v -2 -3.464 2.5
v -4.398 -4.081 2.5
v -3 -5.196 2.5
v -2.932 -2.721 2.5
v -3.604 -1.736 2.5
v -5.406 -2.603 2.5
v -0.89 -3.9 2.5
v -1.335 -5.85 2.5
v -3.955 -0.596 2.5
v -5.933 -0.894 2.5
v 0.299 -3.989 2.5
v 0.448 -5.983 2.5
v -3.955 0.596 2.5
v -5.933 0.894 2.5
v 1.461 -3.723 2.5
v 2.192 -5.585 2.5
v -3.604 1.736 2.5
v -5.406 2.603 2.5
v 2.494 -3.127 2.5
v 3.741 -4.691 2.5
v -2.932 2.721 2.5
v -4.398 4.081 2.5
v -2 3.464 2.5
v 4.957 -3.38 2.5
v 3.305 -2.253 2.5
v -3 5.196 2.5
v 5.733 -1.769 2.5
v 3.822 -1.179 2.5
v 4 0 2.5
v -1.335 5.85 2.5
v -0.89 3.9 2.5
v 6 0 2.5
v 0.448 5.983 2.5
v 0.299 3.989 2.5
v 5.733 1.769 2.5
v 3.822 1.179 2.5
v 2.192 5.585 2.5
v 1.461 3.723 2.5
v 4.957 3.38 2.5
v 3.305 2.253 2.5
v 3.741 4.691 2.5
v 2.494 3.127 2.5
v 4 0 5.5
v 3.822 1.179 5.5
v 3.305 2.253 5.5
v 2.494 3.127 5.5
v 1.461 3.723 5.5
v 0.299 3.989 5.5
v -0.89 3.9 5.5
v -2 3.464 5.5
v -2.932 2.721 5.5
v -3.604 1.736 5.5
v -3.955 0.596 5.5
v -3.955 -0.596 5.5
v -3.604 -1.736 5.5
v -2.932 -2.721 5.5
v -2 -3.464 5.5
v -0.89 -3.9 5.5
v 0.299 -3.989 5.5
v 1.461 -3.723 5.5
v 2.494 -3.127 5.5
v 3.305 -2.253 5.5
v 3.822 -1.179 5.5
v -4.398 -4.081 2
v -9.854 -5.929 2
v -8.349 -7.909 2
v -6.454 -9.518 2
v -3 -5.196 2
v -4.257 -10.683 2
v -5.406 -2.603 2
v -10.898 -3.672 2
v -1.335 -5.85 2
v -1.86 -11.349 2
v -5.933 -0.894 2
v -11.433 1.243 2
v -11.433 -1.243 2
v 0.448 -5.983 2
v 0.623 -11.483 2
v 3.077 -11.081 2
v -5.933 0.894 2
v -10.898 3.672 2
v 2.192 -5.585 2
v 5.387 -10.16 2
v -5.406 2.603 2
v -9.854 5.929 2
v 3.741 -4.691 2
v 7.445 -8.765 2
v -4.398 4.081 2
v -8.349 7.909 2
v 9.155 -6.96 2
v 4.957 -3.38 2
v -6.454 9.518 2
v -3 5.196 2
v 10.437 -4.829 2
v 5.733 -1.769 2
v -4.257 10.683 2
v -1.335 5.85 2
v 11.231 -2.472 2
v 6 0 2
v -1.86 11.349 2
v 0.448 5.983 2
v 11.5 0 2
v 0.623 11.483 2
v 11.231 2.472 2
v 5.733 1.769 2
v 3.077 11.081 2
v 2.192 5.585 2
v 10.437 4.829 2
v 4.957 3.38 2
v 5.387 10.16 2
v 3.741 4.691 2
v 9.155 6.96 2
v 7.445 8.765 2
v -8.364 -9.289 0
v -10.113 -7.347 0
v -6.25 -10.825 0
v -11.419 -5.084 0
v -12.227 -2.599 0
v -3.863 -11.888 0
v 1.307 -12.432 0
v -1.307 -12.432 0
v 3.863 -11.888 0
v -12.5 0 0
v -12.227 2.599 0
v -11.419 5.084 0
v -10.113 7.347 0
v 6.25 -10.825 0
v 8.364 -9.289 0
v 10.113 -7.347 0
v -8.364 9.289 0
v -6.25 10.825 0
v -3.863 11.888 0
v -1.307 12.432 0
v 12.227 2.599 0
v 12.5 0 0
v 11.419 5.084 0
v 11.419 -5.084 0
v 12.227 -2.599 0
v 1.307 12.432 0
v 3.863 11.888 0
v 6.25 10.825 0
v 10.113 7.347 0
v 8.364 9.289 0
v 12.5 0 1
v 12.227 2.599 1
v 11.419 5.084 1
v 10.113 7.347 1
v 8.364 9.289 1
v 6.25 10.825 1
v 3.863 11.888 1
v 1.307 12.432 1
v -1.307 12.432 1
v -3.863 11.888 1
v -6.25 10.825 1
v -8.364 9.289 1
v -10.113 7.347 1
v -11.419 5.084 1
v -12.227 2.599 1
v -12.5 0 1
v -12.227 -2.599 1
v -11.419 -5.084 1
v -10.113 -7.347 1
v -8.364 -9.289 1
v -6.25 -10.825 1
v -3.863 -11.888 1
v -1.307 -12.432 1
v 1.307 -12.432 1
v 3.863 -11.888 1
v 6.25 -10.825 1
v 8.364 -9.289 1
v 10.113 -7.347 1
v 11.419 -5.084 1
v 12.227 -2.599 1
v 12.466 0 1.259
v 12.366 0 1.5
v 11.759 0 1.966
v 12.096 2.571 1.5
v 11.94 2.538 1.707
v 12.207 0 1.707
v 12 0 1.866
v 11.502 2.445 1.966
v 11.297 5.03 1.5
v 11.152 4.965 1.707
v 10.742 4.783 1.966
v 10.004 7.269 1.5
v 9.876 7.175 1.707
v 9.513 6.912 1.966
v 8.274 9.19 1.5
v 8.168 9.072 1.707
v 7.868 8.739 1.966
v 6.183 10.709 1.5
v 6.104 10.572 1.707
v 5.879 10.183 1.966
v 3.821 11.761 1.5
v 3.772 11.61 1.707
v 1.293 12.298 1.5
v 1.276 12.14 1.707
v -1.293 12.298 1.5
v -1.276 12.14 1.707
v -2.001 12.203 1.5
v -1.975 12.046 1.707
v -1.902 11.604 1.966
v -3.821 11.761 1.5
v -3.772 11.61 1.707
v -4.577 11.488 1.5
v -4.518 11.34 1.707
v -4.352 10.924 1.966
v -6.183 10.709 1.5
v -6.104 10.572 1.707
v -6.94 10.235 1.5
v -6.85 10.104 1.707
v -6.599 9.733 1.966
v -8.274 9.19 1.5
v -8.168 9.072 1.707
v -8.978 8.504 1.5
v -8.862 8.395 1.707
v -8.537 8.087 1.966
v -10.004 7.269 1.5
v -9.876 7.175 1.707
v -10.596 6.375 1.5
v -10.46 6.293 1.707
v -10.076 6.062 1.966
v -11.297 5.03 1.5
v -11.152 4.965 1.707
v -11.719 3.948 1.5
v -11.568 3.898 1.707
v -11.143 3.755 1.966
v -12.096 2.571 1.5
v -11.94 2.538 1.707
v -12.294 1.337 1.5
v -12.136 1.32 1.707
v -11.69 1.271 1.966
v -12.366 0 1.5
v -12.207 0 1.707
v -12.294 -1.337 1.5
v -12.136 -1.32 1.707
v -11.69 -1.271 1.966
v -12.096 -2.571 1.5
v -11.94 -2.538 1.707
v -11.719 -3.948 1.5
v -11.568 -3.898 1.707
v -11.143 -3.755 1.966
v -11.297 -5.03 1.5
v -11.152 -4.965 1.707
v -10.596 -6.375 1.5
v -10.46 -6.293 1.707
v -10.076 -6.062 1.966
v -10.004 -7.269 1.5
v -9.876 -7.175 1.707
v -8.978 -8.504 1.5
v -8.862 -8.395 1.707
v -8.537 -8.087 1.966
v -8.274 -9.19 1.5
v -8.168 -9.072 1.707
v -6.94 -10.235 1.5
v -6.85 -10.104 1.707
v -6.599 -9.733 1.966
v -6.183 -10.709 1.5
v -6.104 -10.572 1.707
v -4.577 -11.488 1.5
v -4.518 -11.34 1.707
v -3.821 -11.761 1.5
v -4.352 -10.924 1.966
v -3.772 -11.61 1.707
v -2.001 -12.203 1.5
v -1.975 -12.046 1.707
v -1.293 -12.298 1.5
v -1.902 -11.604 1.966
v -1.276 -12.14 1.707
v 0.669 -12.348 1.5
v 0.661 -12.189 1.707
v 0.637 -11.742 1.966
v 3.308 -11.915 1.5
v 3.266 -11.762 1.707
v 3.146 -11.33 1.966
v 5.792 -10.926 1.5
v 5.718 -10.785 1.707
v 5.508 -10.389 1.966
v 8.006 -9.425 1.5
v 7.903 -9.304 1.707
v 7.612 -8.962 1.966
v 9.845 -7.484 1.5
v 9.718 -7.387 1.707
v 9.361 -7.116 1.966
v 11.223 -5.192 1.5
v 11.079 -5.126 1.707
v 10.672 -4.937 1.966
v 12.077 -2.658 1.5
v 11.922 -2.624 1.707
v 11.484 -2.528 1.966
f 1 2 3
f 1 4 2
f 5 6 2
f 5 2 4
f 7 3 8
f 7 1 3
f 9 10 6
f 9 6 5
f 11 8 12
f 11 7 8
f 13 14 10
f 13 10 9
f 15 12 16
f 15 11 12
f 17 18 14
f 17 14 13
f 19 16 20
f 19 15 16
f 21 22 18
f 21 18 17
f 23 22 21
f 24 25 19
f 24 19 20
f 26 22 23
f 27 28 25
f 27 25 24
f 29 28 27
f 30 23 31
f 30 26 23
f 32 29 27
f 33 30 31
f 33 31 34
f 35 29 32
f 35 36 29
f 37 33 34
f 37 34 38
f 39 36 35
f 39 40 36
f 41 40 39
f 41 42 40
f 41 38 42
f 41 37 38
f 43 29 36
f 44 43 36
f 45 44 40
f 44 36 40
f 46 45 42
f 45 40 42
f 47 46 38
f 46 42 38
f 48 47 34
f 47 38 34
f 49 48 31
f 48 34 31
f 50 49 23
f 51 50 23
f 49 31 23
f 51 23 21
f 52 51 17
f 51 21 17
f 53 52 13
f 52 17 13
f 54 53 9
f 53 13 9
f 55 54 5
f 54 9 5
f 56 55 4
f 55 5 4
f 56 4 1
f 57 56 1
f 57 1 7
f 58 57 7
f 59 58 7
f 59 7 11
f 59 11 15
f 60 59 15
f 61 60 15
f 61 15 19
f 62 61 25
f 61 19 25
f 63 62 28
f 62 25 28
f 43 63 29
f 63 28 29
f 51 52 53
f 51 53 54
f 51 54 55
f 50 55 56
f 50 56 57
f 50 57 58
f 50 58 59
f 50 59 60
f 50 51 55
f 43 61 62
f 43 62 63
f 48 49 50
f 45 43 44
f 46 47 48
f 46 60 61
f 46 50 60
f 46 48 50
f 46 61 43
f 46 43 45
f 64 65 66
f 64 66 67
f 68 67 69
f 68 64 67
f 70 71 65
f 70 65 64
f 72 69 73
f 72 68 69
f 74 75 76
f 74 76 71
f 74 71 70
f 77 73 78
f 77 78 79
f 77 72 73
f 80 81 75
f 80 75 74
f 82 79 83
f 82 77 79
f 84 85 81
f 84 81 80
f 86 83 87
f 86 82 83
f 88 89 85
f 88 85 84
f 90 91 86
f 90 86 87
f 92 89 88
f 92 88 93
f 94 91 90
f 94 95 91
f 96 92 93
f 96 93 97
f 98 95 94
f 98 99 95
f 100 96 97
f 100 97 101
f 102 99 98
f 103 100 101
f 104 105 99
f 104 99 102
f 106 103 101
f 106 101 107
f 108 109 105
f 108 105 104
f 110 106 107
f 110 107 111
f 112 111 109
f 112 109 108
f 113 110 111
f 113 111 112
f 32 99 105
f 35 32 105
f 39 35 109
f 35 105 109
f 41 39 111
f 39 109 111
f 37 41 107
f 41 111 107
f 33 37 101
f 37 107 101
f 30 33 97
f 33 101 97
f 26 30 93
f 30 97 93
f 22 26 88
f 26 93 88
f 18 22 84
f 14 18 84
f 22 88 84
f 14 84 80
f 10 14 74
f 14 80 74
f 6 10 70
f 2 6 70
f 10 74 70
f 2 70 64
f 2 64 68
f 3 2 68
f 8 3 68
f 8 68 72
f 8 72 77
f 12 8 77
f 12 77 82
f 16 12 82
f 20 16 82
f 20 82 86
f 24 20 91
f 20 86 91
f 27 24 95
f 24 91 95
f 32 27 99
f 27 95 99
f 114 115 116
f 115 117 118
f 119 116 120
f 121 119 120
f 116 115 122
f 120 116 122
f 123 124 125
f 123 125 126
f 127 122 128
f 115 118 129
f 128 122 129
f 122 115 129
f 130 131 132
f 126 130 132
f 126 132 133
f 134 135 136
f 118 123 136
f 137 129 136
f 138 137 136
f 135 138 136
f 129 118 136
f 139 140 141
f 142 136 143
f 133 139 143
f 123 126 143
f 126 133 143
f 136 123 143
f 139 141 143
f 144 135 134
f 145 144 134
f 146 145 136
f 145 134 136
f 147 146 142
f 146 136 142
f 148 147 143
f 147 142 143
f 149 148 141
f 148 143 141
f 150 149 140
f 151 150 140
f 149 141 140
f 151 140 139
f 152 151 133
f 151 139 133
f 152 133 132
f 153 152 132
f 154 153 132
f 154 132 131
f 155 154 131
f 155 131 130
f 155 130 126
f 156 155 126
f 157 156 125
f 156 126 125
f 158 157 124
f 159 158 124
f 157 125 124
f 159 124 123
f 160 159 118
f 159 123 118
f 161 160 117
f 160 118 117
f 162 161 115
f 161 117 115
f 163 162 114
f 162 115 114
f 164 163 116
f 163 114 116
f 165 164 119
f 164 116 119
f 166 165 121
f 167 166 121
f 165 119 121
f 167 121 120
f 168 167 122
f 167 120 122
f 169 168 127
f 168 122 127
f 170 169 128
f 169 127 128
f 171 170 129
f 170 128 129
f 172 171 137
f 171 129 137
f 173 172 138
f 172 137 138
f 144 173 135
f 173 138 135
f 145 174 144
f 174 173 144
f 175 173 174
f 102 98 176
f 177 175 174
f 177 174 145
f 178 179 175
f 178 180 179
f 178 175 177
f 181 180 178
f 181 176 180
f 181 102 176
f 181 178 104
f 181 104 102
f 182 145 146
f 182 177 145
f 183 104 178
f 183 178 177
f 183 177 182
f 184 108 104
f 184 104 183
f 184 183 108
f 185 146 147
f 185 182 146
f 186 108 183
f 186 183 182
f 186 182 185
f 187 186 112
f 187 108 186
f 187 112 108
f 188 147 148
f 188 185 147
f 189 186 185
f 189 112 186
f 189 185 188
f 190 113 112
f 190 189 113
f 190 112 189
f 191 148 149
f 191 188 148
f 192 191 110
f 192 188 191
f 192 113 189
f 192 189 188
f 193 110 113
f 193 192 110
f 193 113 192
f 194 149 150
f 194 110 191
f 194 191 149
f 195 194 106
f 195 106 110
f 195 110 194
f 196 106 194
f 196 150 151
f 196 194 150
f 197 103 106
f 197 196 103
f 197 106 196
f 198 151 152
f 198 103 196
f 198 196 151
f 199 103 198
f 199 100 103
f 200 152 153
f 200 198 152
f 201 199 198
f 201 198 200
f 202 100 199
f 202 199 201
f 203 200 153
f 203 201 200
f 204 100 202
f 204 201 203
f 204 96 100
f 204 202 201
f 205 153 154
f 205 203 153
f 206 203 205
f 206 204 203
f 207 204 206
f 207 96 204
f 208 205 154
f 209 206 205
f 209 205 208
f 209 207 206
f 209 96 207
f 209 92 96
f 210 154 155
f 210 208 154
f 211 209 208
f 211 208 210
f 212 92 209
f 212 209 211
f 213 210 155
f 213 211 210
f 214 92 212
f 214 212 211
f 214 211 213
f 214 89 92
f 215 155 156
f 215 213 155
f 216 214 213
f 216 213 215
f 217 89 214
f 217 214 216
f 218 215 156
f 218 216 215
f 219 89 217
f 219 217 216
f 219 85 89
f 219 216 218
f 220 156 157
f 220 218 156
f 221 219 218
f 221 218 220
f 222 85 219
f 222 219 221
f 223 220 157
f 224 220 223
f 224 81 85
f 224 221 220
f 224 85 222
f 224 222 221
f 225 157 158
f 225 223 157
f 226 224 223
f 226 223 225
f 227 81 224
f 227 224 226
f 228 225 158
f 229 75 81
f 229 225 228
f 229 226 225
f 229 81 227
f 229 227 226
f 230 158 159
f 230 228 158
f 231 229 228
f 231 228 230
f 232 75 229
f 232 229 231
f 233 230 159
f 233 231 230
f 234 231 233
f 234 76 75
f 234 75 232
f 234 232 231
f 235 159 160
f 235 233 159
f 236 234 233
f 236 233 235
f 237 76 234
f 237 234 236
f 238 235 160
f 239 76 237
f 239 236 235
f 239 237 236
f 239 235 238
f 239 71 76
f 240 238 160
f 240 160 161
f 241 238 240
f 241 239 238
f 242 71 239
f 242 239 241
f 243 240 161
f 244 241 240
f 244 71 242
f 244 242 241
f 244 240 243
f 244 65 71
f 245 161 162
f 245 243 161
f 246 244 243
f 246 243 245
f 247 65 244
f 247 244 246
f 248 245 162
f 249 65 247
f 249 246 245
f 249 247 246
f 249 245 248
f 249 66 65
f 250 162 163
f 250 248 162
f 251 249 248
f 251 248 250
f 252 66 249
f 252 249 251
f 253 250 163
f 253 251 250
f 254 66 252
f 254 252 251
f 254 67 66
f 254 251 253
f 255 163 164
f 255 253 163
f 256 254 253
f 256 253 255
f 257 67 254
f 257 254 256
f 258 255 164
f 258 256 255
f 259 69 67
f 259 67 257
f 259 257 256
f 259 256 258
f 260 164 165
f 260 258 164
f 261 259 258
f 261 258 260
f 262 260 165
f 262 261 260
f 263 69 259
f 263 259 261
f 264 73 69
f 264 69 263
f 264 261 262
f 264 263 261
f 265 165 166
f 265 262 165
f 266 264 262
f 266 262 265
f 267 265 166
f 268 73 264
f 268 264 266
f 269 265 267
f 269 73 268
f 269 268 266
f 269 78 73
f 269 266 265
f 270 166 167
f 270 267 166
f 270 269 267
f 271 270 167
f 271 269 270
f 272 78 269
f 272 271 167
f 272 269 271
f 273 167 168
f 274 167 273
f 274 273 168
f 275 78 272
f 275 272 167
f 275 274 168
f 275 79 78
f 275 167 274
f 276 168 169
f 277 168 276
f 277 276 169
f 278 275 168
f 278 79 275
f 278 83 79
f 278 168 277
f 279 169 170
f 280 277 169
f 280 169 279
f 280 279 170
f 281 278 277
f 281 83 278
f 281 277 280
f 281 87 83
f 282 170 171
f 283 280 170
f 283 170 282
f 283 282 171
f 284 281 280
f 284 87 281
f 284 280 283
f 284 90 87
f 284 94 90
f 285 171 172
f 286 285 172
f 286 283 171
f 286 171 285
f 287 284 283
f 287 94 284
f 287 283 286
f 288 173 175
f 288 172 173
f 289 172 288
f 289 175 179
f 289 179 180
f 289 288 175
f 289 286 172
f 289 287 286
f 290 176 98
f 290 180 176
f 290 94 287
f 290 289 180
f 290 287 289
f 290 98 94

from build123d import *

# Parameters (mm, degrees)
F0_R     = 12.5
F1_DEPTH = 2
F2_R     = 1
F3_R     = 6
F4_DEPTH = 0.5
F5_R     = 4
F6_DEPTH = 3


with BuildPart() as f1:
    # F0 (on Top) → F1 (new body)
    with BuildSketch(Plane.XY):
        Circle(F0_R)
    extrude(amount=F1_DEPTH)

    # F2
    f2_edges = [f1.edges().sort_by_distance(p)[0] for p in [
        (-12.5, 0, 2),
    ]]
    fillet(f2_edges, radius=F2_R)

    # F3 (on face) → F4 (join)
    with BuildSketch(Plane.XY.offset(2)):
        Circle(F3_R)
    extrude(amount=F4_DEPTH)

    # F5 (on face) → F6 (join)
    with BuildSketch(Plane.XY.offset(2.5)):
        Circle(F5_R)
    extrude(amount=F6_DEPTH)


solid = f1.part
